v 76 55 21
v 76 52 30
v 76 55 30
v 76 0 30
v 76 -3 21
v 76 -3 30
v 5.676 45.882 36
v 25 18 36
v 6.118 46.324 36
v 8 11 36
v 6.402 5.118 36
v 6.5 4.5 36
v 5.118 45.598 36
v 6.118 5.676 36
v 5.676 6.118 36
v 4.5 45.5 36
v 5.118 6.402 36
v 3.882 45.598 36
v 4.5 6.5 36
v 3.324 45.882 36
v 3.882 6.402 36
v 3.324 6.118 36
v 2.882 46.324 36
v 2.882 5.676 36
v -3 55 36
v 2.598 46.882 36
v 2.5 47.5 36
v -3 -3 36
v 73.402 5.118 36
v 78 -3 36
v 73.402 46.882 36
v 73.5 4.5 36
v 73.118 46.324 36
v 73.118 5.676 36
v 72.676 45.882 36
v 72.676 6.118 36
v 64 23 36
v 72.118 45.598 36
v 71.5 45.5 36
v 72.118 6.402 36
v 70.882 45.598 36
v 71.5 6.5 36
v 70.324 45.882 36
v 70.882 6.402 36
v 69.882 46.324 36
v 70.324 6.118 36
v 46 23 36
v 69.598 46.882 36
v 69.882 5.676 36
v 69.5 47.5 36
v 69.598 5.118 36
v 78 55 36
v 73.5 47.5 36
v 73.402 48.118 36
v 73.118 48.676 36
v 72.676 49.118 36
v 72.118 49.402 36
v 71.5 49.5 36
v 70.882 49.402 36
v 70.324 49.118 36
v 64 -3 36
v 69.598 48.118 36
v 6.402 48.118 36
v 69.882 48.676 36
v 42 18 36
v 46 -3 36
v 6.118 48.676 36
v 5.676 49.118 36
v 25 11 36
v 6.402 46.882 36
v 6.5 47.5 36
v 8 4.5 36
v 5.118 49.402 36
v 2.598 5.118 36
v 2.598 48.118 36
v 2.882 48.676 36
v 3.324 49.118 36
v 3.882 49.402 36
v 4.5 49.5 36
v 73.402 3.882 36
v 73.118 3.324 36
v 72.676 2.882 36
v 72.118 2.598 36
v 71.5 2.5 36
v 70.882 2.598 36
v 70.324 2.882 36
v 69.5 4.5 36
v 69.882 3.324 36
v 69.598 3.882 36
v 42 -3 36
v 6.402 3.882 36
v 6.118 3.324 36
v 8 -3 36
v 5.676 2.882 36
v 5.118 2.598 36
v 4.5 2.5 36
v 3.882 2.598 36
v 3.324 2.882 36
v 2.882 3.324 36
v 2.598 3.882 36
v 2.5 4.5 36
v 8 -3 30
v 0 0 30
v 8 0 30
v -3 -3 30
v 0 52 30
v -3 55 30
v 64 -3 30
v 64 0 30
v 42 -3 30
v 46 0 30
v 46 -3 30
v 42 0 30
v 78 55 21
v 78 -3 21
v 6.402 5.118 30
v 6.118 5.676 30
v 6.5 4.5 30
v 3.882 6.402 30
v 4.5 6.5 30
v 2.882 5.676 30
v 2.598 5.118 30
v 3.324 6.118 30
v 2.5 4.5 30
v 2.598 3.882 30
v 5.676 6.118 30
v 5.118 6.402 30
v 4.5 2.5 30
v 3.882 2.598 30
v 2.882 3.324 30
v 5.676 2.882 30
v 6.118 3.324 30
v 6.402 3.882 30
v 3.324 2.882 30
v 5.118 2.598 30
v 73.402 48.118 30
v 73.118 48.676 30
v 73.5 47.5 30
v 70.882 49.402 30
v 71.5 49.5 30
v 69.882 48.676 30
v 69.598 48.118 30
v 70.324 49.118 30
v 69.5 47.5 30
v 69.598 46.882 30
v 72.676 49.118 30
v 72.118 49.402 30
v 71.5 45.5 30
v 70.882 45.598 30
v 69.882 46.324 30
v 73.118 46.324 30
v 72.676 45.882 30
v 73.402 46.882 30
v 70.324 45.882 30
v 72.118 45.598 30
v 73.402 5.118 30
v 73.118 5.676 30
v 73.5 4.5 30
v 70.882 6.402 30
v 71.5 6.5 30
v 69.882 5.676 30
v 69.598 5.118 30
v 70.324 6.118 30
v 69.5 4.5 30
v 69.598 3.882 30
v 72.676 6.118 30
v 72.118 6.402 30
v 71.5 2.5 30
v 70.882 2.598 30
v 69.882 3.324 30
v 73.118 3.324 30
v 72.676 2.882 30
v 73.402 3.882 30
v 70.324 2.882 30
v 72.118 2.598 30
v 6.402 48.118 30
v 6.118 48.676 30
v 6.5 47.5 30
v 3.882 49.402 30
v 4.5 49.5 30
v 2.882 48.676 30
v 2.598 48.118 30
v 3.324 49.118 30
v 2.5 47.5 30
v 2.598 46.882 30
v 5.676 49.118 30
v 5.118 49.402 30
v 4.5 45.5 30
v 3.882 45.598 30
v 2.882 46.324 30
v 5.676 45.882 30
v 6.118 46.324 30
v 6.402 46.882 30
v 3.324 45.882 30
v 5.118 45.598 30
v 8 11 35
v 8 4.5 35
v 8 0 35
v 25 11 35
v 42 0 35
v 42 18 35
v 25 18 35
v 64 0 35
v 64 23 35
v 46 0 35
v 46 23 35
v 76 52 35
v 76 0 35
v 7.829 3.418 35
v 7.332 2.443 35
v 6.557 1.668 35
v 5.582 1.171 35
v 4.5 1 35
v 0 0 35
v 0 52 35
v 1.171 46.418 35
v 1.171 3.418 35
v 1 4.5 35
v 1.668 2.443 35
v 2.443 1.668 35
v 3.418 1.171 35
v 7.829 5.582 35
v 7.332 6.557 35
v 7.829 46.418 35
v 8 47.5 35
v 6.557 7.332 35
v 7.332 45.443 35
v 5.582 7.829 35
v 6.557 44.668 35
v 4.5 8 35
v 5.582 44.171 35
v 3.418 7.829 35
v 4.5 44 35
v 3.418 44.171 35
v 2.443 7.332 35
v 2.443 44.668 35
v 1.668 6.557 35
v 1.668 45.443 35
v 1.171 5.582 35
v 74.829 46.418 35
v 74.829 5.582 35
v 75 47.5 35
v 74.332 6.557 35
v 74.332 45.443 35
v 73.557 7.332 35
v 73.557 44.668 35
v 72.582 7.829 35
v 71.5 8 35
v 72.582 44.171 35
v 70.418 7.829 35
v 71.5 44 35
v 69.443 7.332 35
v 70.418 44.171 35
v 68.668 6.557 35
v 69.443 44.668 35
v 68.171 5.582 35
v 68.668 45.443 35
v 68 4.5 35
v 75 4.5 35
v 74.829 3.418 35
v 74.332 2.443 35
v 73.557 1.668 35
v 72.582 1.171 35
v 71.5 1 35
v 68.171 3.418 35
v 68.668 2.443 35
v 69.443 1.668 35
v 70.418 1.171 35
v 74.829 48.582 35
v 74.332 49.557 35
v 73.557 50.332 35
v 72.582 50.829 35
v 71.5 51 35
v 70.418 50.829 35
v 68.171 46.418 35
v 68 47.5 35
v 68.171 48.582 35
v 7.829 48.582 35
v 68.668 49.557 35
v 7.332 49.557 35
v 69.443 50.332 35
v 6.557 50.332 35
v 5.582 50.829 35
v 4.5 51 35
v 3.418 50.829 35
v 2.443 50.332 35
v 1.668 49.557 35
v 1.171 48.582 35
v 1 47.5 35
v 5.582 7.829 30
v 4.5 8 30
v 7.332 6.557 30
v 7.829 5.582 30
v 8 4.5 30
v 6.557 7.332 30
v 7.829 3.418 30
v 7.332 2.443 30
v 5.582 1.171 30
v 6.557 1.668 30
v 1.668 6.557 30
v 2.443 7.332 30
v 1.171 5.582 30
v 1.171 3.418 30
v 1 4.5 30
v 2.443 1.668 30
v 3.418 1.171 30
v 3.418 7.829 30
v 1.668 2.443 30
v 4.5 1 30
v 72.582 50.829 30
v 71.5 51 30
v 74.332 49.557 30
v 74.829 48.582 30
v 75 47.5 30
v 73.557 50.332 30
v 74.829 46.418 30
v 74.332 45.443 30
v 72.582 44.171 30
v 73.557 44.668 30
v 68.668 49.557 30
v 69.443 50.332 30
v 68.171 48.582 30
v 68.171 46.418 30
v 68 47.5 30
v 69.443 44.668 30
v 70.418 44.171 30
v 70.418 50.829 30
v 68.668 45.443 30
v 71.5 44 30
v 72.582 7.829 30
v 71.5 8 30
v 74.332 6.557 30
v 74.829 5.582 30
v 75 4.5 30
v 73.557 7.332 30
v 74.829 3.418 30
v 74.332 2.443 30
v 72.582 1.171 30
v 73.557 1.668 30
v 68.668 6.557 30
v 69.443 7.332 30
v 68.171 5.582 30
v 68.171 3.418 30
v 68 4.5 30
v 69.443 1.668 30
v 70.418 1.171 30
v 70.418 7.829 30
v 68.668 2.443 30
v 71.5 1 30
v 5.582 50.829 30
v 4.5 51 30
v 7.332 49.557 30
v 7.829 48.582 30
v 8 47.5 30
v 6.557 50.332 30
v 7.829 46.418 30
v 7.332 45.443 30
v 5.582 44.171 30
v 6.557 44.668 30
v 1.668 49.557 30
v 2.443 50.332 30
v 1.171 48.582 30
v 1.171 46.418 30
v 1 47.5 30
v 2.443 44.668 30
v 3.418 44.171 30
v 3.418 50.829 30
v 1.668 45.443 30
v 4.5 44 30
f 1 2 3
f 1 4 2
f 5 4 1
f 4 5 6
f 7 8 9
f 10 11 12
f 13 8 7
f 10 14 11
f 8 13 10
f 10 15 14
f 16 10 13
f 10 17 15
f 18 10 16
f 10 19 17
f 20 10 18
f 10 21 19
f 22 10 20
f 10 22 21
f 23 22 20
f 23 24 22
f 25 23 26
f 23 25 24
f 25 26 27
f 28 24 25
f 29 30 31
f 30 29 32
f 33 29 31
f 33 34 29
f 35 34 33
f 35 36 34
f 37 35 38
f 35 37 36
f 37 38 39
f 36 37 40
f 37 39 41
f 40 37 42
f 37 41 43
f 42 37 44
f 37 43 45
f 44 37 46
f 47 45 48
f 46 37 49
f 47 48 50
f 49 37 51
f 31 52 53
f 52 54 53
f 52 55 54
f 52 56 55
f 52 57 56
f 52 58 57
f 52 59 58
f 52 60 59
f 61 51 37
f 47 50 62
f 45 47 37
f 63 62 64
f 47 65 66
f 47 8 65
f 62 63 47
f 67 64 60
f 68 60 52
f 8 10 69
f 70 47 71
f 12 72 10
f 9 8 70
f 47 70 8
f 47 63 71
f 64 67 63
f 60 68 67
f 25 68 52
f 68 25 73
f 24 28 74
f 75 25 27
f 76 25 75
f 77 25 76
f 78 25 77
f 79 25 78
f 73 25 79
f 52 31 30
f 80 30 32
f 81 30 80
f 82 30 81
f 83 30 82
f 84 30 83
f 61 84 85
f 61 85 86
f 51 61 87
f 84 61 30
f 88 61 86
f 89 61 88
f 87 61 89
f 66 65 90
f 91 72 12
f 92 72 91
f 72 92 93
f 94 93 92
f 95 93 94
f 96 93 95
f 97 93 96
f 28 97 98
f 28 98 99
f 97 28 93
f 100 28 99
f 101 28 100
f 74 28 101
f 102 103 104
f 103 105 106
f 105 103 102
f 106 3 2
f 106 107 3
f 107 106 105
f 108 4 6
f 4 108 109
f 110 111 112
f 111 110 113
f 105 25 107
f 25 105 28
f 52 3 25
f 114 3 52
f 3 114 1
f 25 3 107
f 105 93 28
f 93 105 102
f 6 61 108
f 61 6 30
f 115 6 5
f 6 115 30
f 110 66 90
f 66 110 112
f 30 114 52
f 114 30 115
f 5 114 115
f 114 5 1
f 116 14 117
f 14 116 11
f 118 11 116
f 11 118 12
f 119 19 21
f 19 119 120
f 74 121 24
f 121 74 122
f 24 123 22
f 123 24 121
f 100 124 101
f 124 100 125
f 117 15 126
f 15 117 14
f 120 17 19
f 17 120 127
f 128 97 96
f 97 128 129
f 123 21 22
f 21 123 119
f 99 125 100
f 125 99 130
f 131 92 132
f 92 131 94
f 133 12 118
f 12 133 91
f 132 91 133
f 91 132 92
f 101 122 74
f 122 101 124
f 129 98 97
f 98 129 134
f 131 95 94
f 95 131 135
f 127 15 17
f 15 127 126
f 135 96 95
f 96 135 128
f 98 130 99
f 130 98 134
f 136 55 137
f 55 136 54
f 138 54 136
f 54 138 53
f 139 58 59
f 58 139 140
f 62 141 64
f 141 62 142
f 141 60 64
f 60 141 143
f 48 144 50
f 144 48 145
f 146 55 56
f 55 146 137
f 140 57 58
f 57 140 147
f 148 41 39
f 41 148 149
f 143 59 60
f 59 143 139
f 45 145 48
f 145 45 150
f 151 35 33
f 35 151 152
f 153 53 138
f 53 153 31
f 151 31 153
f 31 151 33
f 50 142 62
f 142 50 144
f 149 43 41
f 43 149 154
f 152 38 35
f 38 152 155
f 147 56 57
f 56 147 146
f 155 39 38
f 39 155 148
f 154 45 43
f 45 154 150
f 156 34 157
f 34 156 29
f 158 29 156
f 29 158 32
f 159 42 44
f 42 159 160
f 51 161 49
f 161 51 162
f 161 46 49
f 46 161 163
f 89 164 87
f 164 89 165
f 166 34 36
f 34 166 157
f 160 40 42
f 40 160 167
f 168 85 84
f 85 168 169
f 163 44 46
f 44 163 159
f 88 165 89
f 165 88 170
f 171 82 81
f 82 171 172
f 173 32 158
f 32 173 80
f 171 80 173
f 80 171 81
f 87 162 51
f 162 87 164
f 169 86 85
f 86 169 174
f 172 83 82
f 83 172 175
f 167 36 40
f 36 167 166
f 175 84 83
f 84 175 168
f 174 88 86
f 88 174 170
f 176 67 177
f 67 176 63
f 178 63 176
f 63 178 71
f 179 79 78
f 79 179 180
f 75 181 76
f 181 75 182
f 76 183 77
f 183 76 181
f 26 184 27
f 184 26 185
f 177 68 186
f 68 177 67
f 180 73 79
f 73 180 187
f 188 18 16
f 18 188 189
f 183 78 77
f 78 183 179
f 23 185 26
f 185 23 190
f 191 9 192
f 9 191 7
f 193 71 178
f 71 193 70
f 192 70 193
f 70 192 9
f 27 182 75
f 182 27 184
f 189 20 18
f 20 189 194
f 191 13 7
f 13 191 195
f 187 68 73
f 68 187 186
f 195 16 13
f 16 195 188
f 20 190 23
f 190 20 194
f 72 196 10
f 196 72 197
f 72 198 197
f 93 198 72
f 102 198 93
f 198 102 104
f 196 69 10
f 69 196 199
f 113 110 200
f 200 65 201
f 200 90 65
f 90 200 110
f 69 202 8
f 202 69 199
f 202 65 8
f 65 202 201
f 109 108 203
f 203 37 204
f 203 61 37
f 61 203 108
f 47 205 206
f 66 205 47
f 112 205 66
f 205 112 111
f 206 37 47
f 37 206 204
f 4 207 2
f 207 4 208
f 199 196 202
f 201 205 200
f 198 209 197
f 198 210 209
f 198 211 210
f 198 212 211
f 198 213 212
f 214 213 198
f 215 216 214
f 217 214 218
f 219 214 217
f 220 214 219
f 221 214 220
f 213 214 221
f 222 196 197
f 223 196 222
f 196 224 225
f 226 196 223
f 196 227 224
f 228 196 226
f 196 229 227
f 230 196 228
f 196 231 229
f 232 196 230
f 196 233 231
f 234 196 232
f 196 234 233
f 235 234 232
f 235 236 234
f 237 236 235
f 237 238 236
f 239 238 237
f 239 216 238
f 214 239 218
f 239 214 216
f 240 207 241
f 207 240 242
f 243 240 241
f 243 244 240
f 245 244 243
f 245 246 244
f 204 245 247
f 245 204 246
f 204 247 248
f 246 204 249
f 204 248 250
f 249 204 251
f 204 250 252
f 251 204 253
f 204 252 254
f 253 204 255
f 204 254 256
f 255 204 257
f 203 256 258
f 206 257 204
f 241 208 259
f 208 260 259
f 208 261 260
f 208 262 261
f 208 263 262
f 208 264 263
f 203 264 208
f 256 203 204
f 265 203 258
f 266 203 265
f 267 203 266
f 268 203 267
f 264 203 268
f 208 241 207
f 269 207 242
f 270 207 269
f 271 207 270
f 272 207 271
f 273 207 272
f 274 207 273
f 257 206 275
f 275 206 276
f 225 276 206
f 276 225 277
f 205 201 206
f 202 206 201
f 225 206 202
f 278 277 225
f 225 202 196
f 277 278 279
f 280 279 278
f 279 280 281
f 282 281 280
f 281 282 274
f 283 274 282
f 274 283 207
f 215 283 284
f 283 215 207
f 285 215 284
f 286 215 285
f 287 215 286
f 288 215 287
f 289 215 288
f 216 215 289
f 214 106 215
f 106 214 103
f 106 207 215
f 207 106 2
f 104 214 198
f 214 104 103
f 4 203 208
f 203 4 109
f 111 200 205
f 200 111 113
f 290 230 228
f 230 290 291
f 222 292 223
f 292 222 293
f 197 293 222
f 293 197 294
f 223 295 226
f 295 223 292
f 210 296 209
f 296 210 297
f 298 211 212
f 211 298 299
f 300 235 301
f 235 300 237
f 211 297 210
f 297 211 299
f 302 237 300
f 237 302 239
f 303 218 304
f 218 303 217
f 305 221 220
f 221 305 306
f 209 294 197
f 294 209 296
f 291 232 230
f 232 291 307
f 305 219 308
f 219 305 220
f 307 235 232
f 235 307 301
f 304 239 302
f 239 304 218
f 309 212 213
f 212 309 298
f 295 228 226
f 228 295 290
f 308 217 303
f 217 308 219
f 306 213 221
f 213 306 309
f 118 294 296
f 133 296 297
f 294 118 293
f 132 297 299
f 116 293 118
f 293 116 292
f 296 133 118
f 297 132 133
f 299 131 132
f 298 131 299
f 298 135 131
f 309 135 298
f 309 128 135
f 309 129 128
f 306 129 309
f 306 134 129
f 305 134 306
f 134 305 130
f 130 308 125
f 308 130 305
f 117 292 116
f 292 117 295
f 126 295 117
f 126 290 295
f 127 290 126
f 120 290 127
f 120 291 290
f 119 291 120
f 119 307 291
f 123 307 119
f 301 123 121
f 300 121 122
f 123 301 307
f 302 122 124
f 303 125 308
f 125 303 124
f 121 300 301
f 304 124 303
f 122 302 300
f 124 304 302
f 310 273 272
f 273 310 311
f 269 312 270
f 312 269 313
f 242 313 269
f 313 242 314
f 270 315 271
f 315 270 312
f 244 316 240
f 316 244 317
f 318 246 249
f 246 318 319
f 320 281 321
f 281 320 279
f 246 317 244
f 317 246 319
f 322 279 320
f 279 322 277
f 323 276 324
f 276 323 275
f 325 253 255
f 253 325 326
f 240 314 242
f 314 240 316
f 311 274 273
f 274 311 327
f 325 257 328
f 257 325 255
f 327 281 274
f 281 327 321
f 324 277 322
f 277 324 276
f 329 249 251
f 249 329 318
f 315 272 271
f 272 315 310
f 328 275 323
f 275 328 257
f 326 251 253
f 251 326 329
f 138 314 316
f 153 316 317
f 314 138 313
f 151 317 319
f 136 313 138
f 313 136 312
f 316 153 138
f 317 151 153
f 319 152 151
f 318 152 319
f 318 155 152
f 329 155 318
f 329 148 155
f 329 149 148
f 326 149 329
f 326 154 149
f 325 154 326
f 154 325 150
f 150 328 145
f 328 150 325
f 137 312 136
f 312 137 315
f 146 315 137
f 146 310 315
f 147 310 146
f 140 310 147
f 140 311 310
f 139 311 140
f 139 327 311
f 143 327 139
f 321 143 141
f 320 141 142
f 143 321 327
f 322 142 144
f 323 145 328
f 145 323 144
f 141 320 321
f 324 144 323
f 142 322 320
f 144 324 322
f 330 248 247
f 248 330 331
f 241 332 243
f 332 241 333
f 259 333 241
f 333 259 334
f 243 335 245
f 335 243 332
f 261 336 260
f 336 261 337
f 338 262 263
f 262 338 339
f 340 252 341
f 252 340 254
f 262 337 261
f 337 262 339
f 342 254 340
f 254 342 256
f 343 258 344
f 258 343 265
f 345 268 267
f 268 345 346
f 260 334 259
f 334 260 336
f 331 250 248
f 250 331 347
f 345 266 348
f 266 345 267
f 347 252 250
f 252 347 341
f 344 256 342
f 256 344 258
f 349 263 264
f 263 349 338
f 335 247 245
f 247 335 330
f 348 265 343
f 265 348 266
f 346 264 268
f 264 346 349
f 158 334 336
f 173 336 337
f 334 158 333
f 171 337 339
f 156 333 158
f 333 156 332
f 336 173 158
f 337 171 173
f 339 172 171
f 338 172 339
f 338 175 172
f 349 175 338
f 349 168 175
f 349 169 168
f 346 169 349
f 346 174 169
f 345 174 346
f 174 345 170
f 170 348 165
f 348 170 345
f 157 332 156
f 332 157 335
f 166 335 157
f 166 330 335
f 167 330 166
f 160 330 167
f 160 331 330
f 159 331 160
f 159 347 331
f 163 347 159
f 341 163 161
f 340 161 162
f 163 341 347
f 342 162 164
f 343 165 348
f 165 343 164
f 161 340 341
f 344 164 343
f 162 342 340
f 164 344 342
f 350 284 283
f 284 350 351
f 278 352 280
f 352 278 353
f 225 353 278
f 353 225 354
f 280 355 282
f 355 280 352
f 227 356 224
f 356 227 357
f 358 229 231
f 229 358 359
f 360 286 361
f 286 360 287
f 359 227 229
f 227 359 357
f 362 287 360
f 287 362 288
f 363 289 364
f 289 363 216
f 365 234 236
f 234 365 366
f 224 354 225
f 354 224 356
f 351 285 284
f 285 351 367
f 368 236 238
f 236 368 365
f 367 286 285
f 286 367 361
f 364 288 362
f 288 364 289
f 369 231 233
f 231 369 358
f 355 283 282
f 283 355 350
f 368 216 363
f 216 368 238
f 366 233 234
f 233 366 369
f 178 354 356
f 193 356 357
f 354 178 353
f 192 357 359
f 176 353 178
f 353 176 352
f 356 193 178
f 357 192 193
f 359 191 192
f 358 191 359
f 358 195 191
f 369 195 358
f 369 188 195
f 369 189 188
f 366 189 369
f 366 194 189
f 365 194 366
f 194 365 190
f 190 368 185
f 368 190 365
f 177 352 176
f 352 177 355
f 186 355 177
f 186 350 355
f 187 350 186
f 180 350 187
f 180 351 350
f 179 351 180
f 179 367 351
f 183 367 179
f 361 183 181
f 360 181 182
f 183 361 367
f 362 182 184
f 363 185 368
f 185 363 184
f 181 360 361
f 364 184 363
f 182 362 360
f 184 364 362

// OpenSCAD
// file: ../library/din_clip_01.scad
CLIP_H = 10;
HOLE_DEPTH = 9;
HOLE_DIAMETER = 2.9;

module din_clip(h=CLIP_H, grow=1) {
        intersection() {
        translate([0,0,-h/2]) cube([20,20,h]);
		linear_extrude(height=h, center=true, convexity=5) {
			import(file="din_clip_01.dxf", layer="0", $fn=64);
		}
    }
        translate([0,grow,0]) intersection() {
        translate([0,20-grow,-h/2]) cube([20,40,h]);
		linear_extrude(height=h, center=true, convexity=5) {
			import(file="din_clip_01.dxf", layer="0", $fn=64);
		}
    }
}

din_clip();
// main file
$fn=20;

use <../library/din_clip_01.scad>

pcb = [75+1,51+1,2];
holes_d = [67,43];
h0 = [(pcb[0]-holes_d[0])/2,(pcb[1]-holes_d[1])/2];
clip_w = 15;
holes = [
    h0,
    [h0[0]+holes_d[0],h0[1]+holes_d[1]],
    [h0[0]+holes_d[0],h0[1]],
    [h0[0],h0[1]+holes_d[1]],
];


t1 = 3;
t2 = 2*t1;
bore_r = 2.8/2;

module bottom() {
intersection() {
difference() {
union() {
difference() {
    translate([-t1,-t1,-t1+1]) cube([pcb[0]+2*t1, pcb[1]+2*t1,t2+1]);
    cube([pcb[0]+t1, pcb[1],5]);
}

for ( hole = holes ){
    hull() {
        translate([hole[0], hole[1]+3,0]) cylinder(r2=2*bore_r,r1=4*bore_r,h=5-2);
        translate([hole[0], hole[1]-3,0]) cylinder(r2=2*bore_r,r1=4*bore_r,h=5-2);
    }
}
}
for ( hole = holes ){
        translate([hole[0], hole[1],-2]) cylinder(r=bore_r,h=6);
    }
}
translate([-t1,-t1,-t1+1]) cube([pcb[0]+t1, pcb[1]+2*t1,t2+1]);
}

translate([(15/2)-t1,0,0])rotate([0,90,0]) din_clip(clip_w);

//hanging clib
translate([pcb[0]-2*clip_w,0,0]) difference() {
translate([clip_w,0,0]) rotate([0,90,0]) din_clip(clip_w*2);
translate([0,0,0]) rotate([0,40,0]) translate([0,0,-clip_w*3]) cube([clip_w*3,pcb[1],clip_w*3]);
}
}

module lid() {
translate([0,0,30]) {
    union() {
    difference() {
        union() {
translate([-t1,-t1,0]) cube([pcb[0]+t1, pcb[1]+2*t1,6]);
translate([pcb[0],-t1,-9]) cube([2, pcb[1]+2*t1,15]);
        }
for ( hole = holes ){
        translate([hole[0], hole[1],0]) cylinder(r=bore_r+0.6,h=6);
    }
    //connectors
    translate([8,-t1,0]) cube([18, 11+t1,6]);
    
    //rj45 can
    translate([25,-t1,0]) cube([17, 18+t1,6]);

    //rj45 lan
    translate([46,-t1,0]) cube([18, 23+t1,6]);
    
    //pins
    //translate([8,45,0]) cube([18.5,3.5,6]);
    
    //component hight
    translate([0,0,0]) cube([pcb[0], pcb[1],5]);
        }
}
for ( hole = holes ){
difference() {
translate([hole[0], hole[1],0]) cylinder(r=7/2,h=6);
    translate([hole[0], hole[1],0]) cylinder(r=bore_r+0.6,h=6);
}
}
}
}
lid();
//bottom();
